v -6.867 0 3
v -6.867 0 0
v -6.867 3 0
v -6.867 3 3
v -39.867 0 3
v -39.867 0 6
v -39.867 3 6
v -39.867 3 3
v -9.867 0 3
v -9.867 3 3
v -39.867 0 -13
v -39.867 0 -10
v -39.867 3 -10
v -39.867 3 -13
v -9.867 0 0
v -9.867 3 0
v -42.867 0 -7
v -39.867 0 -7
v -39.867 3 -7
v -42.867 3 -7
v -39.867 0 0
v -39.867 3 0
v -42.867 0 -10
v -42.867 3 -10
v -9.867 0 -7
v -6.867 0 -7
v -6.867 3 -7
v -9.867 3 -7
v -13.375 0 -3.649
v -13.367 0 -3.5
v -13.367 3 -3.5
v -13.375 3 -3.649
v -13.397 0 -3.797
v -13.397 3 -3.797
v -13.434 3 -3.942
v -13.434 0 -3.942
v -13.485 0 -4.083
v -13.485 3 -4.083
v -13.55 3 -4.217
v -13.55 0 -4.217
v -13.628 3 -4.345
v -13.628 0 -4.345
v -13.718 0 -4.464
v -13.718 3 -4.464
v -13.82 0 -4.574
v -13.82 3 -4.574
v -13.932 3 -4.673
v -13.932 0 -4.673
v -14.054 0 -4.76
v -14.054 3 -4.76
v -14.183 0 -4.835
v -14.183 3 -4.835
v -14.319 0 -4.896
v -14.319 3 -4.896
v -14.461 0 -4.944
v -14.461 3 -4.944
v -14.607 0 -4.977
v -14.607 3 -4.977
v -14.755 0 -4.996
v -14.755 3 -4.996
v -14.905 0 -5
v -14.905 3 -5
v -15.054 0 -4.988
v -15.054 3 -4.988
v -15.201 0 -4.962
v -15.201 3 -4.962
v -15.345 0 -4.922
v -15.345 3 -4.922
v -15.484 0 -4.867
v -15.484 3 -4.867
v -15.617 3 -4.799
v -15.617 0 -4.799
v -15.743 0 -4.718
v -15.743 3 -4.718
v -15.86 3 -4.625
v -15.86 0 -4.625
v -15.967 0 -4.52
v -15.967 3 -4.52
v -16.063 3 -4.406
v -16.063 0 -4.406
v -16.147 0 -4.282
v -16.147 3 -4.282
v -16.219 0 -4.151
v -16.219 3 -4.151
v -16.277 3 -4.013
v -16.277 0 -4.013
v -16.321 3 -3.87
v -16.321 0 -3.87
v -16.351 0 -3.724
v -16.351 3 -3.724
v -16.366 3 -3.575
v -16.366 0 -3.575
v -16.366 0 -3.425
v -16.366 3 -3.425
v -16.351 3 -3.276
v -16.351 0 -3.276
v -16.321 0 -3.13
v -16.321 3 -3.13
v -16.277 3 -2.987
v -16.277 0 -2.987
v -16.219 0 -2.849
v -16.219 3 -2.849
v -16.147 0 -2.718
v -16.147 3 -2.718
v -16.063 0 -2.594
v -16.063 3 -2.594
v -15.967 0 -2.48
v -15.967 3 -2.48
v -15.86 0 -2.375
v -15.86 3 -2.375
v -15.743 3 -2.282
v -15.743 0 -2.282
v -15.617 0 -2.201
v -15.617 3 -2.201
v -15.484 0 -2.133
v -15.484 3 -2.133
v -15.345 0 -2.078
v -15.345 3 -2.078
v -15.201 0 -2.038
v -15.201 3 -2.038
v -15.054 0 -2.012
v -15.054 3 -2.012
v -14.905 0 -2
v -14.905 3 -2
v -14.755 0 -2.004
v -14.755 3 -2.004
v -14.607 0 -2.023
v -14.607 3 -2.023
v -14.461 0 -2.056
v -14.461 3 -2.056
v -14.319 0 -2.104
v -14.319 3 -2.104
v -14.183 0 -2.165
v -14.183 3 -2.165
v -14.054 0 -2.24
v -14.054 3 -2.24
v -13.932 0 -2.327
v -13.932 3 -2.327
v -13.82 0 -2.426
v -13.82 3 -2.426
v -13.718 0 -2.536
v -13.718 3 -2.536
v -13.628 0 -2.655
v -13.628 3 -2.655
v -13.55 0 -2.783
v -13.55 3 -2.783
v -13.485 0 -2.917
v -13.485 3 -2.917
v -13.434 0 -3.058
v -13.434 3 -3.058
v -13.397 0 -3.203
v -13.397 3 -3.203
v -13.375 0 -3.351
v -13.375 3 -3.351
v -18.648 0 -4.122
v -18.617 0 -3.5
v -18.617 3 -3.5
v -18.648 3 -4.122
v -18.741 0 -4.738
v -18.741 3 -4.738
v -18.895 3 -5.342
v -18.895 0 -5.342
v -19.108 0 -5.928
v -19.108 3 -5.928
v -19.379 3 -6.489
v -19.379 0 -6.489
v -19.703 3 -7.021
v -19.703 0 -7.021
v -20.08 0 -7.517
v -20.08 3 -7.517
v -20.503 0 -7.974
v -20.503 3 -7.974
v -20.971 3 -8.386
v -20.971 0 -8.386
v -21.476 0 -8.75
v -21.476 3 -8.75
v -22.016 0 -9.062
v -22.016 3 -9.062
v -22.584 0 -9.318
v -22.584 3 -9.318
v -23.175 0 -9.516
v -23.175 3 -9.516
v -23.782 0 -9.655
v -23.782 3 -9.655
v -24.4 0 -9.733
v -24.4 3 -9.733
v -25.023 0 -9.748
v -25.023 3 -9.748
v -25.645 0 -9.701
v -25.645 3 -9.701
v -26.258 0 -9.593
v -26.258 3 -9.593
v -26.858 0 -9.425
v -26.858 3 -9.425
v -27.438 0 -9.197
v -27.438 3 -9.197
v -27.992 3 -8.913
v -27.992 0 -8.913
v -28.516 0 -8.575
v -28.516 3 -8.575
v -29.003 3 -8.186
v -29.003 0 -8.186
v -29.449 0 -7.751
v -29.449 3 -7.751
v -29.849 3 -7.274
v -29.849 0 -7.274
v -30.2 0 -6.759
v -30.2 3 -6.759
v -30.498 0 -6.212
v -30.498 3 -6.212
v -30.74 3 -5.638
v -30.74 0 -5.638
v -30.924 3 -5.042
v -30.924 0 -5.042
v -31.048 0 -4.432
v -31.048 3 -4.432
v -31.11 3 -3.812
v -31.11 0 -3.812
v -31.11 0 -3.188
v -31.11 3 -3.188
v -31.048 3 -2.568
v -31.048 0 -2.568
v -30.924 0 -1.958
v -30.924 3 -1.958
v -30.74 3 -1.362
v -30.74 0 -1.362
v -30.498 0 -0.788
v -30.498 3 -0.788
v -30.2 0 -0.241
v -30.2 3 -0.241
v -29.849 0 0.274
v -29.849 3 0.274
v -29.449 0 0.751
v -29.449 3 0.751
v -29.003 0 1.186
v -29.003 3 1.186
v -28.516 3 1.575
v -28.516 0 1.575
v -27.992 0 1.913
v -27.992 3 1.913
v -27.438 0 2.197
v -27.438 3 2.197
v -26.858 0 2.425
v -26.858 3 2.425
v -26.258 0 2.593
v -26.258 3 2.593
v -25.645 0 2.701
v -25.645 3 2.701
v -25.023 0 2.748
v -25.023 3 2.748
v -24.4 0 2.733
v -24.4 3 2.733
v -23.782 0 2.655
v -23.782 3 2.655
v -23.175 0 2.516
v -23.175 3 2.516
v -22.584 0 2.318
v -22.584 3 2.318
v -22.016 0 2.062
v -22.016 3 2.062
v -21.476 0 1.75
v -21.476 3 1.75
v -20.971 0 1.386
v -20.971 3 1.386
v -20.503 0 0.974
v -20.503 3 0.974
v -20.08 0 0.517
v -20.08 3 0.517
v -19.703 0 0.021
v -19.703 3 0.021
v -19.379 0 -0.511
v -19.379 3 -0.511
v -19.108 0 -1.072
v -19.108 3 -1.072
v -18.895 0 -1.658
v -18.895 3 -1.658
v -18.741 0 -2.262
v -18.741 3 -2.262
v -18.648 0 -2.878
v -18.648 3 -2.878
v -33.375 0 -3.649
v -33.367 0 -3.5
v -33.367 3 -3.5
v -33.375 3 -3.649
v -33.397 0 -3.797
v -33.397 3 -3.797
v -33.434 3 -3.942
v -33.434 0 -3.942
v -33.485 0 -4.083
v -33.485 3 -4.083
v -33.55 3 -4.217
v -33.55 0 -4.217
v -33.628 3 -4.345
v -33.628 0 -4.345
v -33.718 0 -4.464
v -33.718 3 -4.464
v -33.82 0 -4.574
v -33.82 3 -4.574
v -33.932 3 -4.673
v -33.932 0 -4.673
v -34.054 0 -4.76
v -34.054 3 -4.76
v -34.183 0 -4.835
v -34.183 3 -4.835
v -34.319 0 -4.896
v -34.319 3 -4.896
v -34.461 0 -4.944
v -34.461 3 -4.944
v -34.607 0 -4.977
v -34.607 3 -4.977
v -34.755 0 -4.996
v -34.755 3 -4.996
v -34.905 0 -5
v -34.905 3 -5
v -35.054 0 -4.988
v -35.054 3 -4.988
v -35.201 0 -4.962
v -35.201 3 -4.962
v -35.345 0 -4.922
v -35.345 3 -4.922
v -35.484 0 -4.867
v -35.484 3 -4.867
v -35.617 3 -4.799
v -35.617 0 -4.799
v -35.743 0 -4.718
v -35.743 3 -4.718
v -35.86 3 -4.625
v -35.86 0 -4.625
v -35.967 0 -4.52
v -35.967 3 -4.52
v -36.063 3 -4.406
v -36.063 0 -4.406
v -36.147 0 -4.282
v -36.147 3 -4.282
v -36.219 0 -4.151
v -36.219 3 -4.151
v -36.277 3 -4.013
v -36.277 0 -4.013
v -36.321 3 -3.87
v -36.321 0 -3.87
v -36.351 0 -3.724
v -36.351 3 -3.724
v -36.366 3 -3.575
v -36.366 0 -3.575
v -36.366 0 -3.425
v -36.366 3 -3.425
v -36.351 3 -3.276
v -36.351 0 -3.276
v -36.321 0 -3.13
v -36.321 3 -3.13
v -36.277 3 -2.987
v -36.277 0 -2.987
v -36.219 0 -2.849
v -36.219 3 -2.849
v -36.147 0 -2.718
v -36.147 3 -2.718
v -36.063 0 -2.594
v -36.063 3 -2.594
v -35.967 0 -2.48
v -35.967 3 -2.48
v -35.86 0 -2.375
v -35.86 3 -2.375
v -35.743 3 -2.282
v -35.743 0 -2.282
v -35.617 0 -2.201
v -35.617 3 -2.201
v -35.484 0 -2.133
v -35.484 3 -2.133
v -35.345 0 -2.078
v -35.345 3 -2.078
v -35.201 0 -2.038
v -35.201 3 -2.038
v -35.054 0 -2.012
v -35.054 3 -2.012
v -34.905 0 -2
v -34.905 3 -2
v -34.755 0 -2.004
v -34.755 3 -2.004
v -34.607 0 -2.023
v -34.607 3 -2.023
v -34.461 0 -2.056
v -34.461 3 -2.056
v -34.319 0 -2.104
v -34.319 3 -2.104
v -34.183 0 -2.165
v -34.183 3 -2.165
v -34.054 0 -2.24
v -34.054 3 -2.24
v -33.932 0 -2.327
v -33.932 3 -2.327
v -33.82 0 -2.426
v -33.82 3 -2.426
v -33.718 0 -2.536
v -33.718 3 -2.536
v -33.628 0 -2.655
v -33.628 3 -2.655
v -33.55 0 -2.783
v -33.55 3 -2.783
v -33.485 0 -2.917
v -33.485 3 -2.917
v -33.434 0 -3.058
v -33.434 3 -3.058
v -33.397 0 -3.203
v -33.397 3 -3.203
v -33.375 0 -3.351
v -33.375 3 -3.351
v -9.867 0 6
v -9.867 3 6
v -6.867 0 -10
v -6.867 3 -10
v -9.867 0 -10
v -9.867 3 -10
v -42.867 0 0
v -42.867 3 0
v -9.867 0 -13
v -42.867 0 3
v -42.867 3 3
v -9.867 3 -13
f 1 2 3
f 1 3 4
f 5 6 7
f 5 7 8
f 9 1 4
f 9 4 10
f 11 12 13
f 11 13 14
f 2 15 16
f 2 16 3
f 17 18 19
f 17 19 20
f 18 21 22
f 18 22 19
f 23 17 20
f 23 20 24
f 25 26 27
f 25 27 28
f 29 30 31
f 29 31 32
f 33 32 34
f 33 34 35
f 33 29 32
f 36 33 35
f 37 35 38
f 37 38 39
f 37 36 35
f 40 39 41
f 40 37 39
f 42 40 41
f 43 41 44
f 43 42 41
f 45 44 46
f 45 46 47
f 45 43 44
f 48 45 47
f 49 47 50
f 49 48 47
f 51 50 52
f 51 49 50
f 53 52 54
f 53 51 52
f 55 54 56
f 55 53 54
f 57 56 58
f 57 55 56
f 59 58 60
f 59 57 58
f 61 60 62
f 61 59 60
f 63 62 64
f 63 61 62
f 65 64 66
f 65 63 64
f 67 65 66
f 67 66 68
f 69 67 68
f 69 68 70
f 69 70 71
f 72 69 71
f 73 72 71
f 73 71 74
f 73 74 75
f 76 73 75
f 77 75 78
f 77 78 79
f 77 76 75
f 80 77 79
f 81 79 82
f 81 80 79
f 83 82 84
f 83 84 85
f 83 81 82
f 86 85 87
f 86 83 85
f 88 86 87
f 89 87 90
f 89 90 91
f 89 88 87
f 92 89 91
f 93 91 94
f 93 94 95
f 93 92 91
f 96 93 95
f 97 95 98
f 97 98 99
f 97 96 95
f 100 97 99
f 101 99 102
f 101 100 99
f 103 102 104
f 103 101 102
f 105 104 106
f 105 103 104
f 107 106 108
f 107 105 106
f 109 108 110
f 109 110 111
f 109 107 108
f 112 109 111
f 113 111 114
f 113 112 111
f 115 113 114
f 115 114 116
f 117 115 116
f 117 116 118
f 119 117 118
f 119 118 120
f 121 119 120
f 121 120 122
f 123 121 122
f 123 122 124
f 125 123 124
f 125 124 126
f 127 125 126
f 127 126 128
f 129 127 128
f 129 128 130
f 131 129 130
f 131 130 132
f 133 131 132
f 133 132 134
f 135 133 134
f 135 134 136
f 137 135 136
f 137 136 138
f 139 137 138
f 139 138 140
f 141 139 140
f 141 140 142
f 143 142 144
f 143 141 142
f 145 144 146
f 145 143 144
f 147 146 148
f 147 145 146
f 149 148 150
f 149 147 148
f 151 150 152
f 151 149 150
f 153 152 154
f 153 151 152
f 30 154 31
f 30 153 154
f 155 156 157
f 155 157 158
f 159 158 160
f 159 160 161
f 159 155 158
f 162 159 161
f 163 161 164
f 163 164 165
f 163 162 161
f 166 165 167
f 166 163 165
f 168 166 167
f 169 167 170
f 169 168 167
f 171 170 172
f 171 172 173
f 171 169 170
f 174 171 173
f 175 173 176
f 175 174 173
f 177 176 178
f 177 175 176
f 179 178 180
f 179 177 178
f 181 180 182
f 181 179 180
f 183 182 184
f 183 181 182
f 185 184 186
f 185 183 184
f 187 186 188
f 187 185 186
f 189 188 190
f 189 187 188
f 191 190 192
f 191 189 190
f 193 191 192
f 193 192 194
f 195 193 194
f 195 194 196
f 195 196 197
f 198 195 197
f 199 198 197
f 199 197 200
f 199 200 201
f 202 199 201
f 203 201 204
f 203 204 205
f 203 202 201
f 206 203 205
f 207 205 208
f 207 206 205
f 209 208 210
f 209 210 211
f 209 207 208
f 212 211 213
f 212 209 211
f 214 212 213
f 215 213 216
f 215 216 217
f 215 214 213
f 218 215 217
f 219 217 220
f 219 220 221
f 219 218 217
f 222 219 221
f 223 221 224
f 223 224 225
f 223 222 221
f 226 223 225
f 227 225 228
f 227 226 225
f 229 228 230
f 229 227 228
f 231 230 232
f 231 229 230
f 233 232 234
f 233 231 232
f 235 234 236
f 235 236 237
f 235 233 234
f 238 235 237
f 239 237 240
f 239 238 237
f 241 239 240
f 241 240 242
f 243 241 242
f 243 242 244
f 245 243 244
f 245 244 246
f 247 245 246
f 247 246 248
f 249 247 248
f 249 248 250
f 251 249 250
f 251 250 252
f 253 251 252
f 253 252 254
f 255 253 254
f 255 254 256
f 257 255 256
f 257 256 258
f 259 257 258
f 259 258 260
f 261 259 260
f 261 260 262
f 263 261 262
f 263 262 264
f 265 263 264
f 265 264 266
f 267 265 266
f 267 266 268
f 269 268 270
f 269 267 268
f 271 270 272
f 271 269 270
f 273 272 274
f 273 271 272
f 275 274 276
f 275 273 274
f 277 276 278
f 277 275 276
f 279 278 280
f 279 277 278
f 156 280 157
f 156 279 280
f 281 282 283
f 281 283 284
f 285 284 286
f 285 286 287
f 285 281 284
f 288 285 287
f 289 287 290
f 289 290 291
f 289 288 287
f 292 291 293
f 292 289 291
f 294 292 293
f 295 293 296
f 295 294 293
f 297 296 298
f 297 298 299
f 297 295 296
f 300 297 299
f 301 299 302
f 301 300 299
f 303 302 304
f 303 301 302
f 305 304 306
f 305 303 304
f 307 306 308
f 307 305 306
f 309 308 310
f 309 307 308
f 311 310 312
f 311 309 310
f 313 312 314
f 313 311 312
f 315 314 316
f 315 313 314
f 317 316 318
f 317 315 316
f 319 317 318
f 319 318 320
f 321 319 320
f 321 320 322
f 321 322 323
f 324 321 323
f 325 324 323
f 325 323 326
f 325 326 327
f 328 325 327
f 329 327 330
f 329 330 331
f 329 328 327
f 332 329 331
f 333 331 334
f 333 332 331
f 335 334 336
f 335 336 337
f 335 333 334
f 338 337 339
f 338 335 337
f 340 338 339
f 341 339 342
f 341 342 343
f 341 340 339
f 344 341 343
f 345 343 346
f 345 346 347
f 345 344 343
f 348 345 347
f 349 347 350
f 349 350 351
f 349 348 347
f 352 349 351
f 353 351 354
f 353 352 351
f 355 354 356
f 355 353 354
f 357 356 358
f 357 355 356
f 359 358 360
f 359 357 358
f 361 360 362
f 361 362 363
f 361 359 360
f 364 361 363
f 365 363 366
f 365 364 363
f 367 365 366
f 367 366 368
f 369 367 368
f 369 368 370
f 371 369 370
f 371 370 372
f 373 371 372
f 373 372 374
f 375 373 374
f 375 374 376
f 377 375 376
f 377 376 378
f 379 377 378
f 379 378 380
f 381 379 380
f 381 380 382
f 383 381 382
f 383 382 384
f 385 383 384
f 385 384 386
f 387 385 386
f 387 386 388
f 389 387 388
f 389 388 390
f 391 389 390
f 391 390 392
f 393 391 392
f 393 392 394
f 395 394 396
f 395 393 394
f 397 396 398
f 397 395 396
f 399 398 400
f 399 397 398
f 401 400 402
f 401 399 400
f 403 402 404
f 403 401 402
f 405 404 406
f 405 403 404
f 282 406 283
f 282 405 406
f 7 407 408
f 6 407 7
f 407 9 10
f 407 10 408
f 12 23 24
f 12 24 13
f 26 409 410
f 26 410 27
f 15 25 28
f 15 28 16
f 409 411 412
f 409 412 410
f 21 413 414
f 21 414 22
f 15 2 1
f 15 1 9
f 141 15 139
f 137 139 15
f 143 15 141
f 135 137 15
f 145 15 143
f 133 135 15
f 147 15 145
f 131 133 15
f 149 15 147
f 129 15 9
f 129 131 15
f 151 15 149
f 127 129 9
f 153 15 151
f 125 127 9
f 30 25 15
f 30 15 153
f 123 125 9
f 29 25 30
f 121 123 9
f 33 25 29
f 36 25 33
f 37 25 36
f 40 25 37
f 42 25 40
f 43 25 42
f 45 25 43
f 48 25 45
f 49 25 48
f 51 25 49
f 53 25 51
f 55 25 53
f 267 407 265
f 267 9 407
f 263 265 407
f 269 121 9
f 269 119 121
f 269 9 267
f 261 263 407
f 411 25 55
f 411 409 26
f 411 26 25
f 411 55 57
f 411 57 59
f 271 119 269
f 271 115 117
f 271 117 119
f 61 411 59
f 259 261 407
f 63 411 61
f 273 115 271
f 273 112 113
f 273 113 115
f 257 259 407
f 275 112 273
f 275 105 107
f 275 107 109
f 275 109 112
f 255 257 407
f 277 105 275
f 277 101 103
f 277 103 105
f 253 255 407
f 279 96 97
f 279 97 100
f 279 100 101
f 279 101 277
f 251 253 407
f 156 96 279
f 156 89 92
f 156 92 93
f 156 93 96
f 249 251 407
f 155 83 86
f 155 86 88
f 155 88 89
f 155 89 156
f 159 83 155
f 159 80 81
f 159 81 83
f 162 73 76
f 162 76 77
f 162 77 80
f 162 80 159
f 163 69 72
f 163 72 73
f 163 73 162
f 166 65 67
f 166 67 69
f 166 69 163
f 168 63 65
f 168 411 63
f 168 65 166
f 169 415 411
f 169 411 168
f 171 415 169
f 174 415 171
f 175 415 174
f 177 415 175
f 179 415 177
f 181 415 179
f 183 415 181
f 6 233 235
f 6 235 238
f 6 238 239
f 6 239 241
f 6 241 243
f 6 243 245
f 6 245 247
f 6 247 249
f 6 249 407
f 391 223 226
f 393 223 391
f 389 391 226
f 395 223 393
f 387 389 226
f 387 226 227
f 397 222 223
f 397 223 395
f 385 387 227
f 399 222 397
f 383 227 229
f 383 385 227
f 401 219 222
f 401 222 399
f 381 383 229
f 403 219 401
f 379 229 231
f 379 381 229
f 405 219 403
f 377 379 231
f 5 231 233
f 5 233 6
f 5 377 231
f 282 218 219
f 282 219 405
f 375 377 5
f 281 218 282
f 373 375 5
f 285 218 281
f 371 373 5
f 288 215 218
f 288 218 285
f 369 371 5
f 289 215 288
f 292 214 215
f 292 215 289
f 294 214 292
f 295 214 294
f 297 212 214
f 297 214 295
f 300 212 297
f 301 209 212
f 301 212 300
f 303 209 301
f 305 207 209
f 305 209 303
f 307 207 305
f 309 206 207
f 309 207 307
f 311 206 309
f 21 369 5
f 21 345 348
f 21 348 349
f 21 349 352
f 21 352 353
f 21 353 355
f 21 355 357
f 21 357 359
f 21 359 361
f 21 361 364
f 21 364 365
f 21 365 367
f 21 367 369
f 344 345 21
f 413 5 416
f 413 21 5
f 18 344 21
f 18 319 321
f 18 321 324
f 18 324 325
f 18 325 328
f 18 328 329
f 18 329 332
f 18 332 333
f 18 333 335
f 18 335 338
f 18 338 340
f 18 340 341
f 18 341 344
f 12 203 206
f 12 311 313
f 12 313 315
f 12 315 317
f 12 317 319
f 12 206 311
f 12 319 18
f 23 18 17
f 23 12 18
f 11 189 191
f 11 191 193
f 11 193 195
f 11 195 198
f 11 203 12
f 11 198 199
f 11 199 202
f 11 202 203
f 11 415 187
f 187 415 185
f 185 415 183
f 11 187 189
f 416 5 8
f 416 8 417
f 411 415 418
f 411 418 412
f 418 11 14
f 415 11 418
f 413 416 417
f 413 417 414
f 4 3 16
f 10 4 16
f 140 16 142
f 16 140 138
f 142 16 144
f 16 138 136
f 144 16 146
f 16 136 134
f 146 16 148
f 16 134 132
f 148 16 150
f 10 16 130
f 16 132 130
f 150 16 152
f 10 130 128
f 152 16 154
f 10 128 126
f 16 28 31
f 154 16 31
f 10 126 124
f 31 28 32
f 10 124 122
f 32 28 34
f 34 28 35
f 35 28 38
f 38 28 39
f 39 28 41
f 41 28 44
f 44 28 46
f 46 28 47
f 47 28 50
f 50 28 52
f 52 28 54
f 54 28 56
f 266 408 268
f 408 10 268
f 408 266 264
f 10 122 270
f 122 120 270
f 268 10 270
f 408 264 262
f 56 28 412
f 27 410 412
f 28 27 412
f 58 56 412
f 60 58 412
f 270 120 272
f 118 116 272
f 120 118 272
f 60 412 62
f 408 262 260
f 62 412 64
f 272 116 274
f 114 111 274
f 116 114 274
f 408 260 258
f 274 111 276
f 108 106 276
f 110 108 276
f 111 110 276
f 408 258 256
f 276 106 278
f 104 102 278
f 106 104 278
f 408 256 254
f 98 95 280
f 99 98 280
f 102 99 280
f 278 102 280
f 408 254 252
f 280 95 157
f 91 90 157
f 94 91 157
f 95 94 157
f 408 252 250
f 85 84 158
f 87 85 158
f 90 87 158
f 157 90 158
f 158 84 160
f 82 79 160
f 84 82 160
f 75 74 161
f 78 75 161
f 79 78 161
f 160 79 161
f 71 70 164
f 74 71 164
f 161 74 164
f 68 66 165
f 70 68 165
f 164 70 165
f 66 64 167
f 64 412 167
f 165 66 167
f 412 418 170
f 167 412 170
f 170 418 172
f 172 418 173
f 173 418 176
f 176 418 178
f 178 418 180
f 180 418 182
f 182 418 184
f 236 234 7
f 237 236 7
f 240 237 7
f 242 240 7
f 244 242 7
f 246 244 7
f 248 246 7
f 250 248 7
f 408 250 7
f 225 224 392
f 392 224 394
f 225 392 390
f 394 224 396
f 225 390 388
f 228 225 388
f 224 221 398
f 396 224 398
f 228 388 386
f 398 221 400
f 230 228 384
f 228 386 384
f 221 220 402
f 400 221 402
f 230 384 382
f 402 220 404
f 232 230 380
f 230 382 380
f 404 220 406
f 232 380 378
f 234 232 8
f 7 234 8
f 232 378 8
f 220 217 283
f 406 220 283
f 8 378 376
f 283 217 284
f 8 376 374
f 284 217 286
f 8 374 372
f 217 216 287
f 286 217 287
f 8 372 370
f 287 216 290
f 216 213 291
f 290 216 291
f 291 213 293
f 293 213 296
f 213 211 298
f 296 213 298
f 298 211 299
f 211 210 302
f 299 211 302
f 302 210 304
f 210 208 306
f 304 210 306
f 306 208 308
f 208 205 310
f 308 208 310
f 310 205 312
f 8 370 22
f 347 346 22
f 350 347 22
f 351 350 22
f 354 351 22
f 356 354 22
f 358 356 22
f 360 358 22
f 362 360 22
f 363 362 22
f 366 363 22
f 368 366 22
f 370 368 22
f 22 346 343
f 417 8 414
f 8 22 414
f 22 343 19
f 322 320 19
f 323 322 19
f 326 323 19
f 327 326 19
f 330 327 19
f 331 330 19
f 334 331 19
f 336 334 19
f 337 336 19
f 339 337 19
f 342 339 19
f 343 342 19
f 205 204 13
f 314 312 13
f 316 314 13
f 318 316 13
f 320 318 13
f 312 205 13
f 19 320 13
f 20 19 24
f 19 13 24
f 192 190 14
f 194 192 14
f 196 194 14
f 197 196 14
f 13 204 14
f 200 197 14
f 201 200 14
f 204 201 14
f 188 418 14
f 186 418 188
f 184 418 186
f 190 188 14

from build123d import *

# Parameters (mm, degrees)
SKETCH1_R           = 6.25
SKETCH1_R_2         = 1.5
BOSS_EXTRUDE1_DEPTH = 3


with BuildPart() as part:
    # Sketch1 → Boss-Extrude1 (new body)
    with BuildSketch(Plane(origin=(0, 0, 0), x_dir=(1, 0, 0), z_dir=(0, 1, 0))):
        Polygon((-42.867412192, 7), (-42.867412192, 10), (-39.867412192, 10), (-39.867412192, 13), (-9.867412192, 13), (-9.867412192, 10), (-6.867412192, 10), (-6.867412192, 7), (-9.867412192, 7), (-9.867412192, 0), (-6.867412192, 0), (-6.867412192, -3), (-9.867412192, -3), (-9.867412192, -6), (-39.867412192, -6), (-39.867412192, -3), (-42.867412192, -3), (-42.867412192, 0), (-39.867412192, 0), (-39.867412192, 7), align=None)
        with Locations((-24.867412192, 3.5)):
            Circle(SKETCH1_R, mode=Mode.SUBTRACT)
        with Locations((-34.867412192, 3.5)):
            Circle(SKETCH1_R_2, mode=Mode.SUBTRACT)
        with Locations((-14.867412192, 3.5)):
            Circle(SKETCH1_R_2, mode=Mode.SUBTRACT)
    extrude(amount=BOSS_EXTRUDE1_DEPTH)


solid = part.part
